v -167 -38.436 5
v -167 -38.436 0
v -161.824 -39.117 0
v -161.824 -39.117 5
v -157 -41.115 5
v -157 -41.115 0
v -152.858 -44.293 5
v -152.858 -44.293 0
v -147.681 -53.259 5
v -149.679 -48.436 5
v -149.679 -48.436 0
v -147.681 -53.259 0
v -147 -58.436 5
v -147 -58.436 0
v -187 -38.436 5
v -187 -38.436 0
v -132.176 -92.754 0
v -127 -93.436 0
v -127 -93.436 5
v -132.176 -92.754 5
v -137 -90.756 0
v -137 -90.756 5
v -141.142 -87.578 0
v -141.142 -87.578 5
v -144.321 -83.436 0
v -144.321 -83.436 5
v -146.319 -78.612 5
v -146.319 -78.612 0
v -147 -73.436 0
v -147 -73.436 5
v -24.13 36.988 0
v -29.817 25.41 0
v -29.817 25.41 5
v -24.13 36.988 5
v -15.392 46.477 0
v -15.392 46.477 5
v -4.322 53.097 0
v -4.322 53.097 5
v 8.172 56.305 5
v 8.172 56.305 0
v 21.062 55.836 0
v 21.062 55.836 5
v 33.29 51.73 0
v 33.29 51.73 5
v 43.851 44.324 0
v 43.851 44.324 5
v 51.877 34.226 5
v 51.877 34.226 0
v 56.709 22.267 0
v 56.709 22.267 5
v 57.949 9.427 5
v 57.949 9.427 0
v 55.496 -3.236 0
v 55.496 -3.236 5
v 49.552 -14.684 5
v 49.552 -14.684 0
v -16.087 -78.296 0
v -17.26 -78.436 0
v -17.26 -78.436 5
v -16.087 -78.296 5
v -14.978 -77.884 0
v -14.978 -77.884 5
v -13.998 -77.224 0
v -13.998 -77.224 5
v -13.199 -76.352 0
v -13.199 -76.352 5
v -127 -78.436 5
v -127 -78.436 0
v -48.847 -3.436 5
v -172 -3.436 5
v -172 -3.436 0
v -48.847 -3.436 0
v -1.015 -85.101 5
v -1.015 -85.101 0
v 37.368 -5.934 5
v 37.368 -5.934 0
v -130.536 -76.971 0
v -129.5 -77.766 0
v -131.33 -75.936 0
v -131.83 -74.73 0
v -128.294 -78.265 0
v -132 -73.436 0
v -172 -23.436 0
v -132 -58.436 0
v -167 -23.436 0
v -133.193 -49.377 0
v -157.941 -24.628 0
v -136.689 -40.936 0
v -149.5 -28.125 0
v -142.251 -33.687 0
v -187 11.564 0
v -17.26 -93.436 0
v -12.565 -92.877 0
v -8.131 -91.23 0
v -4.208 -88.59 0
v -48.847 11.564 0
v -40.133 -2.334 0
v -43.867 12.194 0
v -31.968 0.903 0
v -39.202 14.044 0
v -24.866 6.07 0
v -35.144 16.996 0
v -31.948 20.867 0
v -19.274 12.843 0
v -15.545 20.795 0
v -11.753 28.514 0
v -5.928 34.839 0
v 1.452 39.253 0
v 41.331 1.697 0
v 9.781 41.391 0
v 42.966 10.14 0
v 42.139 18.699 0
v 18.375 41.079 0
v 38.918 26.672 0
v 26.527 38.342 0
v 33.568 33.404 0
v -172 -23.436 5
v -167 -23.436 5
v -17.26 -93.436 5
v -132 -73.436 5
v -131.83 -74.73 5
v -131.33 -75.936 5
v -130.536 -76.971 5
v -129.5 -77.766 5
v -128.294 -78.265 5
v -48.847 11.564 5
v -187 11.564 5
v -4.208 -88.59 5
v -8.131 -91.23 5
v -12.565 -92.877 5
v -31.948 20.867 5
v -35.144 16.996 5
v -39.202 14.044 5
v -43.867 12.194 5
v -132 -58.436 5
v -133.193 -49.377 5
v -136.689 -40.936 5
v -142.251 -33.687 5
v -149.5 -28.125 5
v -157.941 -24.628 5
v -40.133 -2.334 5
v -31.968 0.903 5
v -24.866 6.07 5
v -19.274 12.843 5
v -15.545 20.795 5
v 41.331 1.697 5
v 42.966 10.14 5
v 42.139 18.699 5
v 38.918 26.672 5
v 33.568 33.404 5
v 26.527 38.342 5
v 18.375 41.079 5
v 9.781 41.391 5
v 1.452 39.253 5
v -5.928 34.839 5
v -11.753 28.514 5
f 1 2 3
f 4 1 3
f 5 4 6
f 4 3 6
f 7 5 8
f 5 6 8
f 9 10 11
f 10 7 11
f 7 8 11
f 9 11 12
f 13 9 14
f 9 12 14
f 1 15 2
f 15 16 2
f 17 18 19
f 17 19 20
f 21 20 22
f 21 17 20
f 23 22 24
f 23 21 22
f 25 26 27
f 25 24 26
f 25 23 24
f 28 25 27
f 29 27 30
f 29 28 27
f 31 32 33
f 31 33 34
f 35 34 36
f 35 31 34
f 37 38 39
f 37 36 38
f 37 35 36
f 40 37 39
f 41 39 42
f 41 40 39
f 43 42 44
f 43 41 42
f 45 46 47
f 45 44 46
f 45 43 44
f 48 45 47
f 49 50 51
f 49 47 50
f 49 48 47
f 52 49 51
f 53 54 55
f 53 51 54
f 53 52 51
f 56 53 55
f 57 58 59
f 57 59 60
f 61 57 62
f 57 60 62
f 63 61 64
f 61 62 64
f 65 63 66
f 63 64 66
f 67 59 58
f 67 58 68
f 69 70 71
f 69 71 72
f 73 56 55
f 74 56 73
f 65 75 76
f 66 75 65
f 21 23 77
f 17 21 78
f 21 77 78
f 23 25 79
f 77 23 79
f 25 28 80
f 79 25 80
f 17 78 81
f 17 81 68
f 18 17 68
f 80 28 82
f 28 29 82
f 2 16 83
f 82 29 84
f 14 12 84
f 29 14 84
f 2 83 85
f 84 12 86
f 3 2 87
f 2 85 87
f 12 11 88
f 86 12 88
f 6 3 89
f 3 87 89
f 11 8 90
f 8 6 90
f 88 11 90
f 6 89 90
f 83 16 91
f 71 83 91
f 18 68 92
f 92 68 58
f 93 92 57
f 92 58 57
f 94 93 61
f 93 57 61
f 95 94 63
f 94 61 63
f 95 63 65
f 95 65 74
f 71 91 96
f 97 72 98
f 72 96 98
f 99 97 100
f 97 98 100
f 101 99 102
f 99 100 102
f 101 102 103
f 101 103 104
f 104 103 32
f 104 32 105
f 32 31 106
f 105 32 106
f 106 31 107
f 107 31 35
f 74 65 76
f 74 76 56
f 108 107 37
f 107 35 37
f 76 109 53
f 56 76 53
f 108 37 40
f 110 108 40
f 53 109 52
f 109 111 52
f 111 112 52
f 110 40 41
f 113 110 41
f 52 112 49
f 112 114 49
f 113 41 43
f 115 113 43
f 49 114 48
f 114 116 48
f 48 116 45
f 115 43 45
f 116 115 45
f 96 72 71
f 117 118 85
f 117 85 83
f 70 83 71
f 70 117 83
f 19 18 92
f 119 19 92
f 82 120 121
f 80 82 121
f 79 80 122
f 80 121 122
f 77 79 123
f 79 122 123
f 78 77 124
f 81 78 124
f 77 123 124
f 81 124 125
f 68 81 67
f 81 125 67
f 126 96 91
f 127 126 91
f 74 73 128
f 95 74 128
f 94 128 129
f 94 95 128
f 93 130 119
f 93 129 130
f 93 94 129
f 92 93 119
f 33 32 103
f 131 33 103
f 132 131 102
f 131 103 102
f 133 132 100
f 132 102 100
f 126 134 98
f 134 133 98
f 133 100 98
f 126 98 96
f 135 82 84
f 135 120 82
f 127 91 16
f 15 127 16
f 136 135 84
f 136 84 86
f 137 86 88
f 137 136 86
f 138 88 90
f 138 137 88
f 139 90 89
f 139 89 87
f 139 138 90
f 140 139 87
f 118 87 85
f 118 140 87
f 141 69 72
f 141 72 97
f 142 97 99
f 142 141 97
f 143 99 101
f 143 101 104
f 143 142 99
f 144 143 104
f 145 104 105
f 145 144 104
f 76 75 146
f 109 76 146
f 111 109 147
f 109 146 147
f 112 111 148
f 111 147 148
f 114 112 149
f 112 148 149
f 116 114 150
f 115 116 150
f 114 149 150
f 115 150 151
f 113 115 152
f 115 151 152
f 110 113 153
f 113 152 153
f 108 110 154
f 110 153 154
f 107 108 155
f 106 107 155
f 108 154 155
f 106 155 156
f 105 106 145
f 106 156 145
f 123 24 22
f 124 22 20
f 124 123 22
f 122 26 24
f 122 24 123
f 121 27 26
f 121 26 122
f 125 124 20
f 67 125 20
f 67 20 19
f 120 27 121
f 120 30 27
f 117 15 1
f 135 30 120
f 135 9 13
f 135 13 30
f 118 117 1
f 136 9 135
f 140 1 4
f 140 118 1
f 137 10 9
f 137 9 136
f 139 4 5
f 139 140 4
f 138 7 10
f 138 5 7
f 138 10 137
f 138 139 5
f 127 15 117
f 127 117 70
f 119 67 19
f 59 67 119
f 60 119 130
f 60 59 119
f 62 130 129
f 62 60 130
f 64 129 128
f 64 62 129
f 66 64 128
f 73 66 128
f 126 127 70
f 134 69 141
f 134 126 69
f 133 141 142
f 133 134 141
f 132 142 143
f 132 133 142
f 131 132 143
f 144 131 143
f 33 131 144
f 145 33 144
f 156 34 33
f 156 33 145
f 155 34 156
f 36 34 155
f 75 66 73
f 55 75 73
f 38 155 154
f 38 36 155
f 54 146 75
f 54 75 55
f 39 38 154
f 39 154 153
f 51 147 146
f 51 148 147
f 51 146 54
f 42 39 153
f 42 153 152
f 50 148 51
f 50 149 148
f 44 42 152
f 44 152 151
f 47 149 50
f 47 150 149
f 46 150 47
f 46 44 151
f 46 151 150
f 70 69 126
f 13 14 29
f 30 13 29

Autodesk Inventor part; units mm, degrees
ref_plane "YZ Plane" through (0, 0, 0) normal (1, 0, 0) x (0, 1, 0)
ref_plane "XZ Plane" through (0, 0, 0) normal (0, 1, 0) x (-1, 0, 0)
ref_plane "XY Plane" through (0, 0, 0) normal (0, 0, 1) x (1, 0, 0)
sketch "Sketch1" plane through (0, 0, 0) normal (0, 0, 1) x (1, 0, 0)
  line L0 (-48.8466, 11.5644) -> (-187, 11.5644)
  line L1 (-187, 11.5644) -> (-187, -38.4356)
  line L2 (-187, -38.4356) -> (-167, -38.4356)
  line L3 (-147, -58.4356) -> (-147, -73.4356)
  line L4 (-127, -93.4356) -> (-17.2605, -93.4356)
  arc A0 (49.5519, -14.6836) -> (-29.8169, 25.4105) centre (13, 11.5644) ccw
  line L5 (49.5519, -14.6836) -> (-1.0152, -85.1014)
  arc A1 (-48.8466, 11.5644) -> (-29.8169, 25.4105) centre (-48.8466, 31.5644) ccw
  arc A2 (-147, -58.4356) -> (-167, -38.4356) centre (-167, -58.4356) ccw
  arc A3 (-147, -73.4356) -> (-127, -93.4356) centre (-127, -73.4356) ccw
  arc A4 (-17.2605, -93.4356) -> (-1.0152, -85.1014) centre (-17.2605, -73.4356) ccw
  point P0 (0, 0)
  point P1 (-32, 11.5644)
  point P2 (-147, -38.4356)
  point P3 (-147, -93.4356)
  point P4 (-7, -93.4356)
  dimension "d1" = 0
  dimension "d2" = 105
  dimension "d21" = 200
  dimension "d22" = 40
  dimension "d23" = 50
  dimension "d24" = 180
  dimension "d25" = 45
  dimension "d38" = 20
  dimension "d39" = 20
extrude "Extrusion1" add sketch "Sketch1" along normal blind 5
sketch "Sketch2" plane through (0, 0, 5) normal (0, 0, 1) x (1, 0, 0)
  arc A0 (-48.8466, 11.5644) -> (-29.8169, 25.4105) centre (-48.8466, 31.5644) ccw projected
  line L0 (-48.8466, 11.5644) -> (-187, 11.5644) projected
  line L1 (-187, 11.5644) -> (-187, -38.4356) projected
  line L2 (-187, -38.4356) -> (-167, -38.4356) projected
  arc A1 (-147, -58.4356) -> (-167, -38.4356) centre (-167, -58.4356) ccw projected
  line L3 (-147, -58.4356) -> (-147, -73.4356) projected
  arc A2 (-147, -73.4356) -> (-127, -93.4356) centre (-127, -73.4356) ccw projected
  line L4 (-127, -93.4356) -> (-17.2605, -93.4356) projected
  arc A3 (-17.2605, -93.4356) -> (-1.0152, -85.1014) centre (-17.2605, -73.4356) ccw projected
  line L5 (-1.0152, -85.1014) -> (49.5519, -14.6836) projected
  arc A4 (49.5519, -14.6836) -> (-29.8169, 25.4105) centre (13, 11.5644) ccw projected
  line L6 (-172, -3.4356) -> (-48.8466, -3.4356)
  arc A5 (-48.8466, -3.4356) -> (-15.5446, 20.7951) centre (-48.8466, 31.5644) ccw
  arc A6 (37.368, -5.9343) -> (-15.5446, 20.7951) centre (13, 11.5644) ccw
  line L7 (37.368, -5.9343) -> (-13.1992, -76.3521)
  arc A7 (-17.2605, -78.4356) -> (-13.1992, -76.3521) centre (-17.2605, -73.4356) ccw
  line L8 (-17.2605, -78.4356) -> (-127, -78.4356)
  arc A8 (-132, -73.4356) -> (-127, -78.4356) centre (-127, -73.4356) ccw
  line L9 (-132, -73.4356) -> (-132, -58.4356)
  arc A9 (-132, -58.4356) -> (-167, -23.4356) centre (-167, -58.4356) ccw
  line L10 (-167, -23.4356) -> (-172, -23.4356)
  line L11 (-172, -23.4356) -> (-172, -3.4356)
  point P0 (0, 0)
  dimension "d42" = 15
extrude "Extrusion2" cut sketch "Sketch2" against normal through all contours L6 A5 A6 L7 A7 L8 A8 L9 A9 L10 L11
sketch "Sketch3" plane through (0, 0, 5) normal (0, 0, 1) x (1, 0, 0)
  point P0 (0, 0)
sketch "Sketch4" plane through (0, 0, 5) normal (0, 0, 1) x (1, 0, 0)
  point P0 (0, 0)
properties part number "GASKET"
